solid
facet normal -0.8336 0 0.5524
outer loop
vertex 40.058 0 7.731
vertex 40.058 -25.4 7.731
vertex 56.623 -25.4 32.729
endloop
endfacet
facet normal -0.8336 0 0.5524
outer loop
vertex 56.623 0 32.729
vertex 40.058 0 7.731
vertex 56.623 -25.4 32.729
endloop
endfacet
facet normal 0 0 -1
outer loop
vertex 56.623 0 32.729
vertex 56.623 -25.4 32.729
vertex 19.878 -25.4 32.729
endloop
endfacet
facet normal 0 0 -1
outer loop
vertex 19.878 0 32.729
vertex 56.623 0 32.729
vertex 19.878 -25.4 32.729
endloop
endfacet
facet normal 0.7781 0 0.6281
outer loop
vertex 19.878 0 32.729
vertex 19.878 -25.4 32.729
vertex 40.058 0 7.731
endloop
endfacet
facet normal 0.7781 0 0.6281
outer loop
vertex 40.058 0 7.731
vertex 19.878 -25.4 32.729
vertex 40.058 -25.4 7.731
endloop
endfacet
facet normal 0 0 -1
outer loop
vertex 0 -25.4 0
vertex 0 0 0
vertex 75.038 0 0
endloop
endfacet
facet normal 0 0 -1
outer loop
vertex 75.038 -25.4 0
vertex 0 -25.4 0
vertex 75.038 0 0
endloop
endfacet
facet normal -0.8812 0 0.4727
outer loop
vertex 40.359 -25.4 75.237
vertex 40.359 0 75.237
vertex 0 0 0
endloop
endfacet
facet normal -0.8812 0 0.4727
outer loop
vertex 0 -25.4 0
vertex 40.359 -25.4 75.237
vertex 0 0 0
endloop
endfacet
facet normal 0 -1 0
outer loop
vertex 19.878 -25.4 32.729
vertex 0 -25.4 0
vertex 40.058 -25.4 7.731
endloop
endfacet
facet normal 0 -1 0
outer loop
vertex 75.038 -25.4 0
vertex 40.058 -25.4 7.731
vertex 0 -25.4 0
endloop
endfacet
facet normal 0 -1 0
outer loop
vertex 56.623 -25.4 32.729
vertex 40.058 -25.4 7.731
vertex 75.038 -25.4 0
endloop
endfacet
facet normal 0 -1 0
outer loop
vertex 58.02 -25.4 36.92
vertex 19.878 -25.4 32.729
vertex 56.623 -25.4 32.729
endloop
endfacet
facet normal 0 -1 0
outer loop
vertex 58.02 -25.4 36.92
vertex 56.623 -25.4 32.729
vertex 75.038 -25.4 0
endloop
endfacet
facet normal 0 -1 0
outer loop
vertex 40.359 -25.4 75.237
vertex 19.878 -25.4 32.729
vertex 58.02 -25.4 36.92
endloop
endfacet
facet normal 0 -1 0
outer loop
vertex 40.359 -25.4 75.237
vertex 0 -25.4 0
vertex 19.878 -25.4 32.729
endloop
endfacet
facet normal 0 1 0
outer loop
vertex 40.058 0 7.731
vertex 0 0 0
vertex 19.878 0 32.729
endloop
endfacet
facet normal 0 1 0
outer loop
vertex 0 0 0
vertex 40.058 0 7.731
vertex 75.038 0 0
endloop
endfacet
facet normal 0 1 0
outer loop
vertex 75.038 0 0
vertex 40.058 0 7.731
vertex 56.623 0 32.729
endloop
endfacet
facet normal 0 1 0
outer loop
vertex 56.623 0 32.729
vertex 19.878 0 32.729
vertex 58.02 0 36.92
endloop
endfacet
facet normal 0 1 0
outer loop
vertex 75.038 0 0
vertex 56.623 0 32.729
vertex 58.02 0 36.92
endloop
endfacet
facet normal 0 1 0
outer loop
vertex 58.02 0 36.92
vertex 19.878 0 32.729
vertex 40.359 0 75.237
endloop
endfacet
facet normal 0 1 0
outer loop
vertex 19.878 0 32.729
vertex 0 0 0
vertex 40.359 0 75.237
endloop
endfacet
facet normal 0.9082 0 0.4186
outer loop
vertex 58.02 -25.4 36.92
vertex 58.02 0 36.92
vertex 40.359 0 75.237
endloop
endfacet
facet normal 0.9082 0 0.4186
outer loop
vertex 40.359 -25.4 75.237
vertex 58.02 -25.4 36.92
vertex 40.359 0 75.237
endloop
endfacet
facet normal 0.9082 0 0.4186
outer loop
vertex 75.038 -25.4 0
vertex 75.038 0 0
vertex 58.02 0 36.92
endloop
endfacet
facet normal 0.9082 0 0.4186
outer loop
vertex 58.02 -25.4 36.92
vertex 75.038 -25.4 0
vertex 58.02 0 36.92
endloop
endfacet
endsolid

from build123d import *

# Parameters (mm, degrees)
F1_DEPTH = 25.4
F3_DEPTH = 25.4


with BuildPart() as f1:
    # F0 (on Front) → F1 (new body)
    with BuildSketch(Plane.XZ):
        Polygon((58.0202316056, 36.9197579437), (40.3588265181, 75.2369578606), (20.0064992297, 37.2961324534), align=None)
        Polygon((40.3588265181, 0), (20.0064992297, 37.2961324534), (0, 0), align=None)
        Polygon((58.0202316056, 36.9197579437), (20.0064992297, 37.2961324534), (40.3588265181, 0), align=None)
        Polygon((75.0375189384, 0), (58.0202316056, 36.9197579437), (40.3588265181, 0), align=None)
    extrude(amount=F1_DEPTH)

    # F2 (on Front) → F3 (cut, symmetric)
    with BuildSketch(Plane.XZ):
        Polygon((56.622825563, 32.7289290726), (19.8782272637, 32.7289290726), (40.0576405227, 7.730553858), align=None)
    extrude(amount=F3_DEPTH, both=True, mode=Mode.SUBTRACT)


solid = f1.part
